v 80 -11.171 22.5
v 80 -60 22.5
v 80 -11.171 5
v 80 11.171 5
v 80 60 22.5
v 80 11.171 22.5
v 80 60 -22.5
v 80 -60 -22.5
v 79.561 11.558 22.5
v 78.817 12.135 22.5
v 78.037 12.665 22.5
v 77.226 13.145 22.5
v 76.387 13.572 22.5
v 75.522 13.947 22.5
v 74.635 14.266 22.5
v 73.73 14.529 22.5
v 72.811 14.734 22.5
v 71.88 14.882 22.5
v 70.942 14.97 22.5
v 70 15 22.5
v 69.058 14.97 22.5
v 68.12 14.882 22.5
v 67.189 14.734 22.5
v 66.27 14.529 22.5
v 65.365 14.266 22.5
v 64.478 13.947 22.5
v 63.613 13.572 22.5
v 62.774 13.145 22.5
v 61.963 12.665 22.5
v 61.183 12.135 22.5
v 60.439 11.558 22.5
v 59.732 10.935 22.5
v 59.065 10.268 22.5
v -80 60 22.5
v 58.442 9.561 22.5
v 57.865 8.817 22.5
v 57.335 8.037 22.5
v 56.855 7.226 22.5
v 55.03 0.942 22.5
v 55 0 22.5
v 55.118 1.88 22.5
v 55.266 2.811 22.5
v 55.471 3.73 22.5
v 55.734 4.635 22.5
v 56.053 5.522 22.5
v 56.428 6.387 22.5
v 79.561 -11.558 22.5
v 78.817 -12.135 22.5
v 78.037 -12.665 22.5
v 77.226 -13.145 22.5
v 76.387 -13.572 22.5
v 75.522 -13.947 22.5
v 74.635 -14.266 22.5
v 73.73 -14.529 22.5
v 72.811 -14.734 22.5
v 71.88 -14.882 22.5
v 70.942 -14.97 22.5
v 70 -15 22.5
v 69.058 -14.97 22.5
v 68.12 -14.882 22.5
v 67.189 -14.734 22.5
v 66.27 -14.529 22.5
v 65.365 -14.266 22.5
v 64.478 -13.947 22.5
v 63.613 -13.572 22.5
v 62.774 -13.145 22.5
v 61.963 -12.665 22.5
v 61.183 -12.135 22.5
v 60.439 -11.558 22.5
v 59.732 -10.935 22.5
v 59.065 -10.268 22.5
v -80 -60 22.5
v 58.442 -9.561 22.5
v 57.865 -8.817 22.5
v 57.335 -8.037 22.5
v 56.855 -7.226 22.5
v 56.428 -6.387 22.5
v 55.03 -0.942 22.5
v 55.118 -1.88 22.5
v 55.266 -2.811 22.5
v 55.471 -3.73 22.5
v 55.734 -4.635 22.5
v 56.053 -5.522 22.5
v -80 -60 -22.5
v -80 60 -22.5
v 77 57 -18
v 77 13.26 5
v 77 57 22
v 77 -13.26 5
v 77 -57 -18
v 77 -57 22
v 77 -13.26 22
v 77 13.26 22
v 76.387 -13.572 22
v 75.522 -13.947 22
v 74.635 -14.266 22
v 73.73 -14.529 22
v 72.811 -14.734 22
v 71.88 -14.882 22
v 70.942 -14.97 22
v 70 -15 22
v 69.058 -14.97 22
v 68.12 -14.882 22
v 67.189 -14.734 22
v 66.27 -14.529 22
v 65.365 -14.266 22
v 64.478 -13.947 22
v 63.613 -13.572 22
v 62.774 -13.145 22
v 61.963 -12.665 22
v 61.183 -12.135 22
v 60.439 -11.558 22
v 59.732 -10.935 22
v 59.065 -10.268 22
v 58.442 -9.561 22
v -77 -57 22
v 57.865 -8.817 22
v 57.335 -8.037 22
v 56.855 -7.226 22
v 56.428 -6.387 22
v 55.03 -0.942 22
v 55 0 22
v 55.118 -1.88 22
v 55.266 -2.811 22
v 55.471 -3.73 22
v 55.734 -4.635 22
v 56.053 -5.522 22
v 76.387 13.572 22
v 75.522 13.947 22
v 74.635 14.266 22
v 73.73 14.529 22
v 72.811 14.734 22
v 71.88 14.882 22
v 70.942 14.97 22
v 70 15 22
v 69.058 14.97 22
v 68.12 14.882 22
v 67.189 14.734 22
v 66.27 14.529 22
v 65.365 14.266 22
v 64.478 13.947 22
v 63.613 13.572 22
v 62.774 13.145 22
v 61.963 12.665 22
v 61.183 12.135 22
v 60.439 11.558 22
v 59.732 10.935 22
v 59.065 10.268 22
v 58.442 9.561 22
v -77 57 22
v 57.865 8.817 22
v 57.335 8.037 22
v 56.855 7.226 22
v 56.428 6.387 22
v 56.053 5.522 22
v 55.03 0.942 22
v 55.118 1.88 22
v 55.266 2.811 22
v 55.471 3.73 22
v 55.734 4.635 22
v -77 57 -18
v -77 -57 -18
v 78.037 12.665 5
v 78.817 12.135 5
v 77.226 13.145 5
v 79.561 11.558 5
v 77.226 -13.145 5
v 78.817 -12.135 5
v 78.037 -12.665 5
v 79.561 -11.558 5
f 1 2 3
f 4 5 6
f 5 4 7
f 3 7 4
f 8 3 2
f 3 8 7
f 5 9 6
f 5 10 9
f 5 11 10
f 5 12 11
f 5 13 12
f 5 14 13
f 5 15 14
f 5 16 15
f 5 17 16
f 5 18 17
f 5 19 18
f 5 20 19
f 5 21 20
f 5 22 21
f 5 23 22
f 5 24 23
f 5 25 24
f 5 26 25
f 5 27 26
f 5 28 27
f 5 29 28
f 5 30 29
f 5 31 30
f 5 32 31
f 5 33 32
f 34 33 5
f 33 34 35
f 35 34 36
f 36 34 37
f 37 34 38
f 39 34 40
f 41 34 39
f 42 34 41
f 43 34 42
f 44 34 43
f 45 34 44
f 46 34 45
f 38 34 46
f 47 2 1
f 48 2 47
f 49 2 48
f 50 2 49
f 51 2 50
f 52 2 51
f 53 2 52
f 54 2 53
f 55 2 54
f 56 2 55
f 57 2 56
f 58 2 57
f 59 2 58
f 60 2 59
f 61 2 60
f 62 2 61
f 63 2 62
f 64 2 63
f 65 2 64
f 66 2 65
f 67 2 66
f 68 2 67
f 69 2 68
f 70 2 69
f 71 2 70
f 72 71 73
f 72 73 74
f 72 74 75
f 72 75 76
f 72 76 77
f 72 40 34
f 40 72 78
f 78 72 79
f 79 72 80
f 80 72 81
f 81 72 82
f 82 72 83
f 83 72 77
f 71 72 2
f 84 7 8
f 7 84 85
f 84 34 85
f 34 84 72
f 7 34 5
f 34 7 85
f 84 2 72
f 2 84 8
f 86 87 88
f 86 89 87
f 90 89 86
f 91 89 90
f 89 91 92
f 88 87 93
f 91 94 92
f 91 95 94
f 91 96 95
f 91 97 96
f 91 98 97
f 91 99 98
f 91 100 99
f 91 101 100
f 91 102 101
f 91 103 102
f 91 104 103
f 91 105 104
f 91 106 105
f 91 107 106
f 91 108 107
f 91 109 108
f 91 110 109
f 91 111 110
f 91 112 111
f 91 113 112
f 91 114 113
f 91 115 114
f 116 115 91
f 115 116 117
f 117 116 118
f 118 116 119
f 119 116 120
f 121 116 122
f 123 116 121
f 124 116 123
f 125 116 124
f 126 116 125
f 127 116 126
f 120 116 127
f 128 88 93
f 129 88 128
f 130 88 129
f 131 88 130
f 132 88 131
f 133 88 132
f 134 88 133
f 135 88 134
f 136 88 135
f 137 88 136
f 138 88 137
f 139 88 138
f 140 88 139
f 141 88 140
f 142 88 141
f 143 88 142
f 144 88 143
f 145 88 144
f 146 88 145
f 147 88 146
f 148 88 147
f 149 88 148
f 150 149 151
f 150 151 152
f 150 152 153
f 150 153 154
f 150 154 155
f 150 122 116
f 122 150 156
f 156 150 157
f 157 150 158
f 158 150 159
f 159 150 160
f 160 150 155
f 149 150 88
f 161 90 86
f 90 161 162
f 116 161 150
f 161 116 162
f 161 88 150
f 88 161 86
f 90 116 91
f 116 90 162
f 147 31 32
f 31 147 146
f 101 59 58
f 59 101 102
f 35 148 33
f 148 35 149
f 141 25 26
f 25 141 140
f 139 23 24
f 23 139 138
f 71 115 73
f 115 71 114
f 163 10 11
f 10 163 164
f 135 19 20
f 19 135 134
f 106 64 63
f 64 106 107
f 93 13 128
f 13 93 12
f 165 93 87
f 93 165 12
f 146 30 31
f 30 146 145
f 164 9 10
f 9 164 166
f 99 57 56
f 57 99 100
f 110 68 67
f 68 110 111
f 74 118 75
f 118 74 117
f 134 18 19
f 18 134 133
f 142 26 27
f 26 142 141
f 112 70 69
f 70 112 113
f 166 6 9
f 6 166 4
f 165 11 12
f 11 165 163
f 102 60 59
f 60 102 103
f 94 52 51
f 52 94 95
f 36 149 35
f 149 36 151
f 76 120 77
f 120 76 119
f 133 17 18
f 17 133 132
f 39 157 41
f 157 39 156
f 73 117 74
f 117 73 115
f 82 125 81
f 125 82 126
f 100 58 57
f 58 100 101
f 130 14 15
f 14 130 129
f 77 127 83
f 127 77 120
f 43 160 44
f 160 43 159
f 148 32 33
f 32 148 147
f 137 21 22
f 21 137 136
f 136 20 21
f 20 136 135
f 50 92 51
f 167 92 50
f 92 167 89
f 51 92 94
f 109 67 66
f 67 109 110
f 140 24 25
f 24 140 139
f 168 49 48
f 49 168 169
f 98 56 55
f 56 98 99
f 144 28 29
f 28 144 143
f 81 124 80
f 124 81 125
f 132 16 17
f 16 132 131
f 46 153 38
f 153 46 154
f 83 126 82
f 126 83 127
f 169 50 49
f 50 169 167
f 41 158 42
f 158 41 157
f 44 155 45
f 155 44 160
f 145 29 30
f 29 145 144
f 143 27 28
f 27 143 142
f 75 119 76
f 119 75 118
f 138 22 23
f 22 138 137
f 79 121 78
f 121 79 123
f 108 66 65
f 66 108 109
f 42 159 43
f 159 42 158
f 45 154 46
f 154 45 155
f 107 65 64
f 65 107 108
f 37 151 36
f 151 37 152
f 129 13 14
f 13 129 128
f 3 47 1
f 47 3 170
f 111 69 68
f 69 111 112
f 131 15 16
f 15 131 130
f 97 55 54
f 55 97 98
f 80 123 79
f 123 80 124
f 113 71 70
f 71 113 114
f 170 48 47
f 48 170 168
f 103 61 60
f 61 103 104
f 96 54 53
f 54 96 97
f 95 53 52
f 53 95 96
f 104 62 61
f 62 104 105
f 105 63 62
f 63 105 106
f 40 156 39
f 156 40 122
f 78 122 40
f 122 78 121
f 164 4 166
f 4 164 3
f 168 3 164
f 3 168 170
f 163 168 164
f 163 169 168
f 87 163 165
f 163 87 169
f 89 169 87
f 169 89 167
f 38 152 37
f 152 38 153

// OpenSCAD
// OpenSCAD Module for the Hex-Brain Logic Core Enclosure
module hex_brain_chassis() {
    difference() {
        // Main structural enclosure perimeter
        cube([160, 120, 45], center = true);
        
        // Internal cavity for the 8-layer KiCad board assembly
        translate([0, 0, 2])
            cube([154, 114, 40], center = true);
            
        // Exhaust routing channels for the centrifugal thermal management system
        translate([70, 0, 15])
            cylinder(h = 20, r = 15, center = true, $fn = 100);
    }
}

// Instantiate the chassis model
hex_brain_chassis();
